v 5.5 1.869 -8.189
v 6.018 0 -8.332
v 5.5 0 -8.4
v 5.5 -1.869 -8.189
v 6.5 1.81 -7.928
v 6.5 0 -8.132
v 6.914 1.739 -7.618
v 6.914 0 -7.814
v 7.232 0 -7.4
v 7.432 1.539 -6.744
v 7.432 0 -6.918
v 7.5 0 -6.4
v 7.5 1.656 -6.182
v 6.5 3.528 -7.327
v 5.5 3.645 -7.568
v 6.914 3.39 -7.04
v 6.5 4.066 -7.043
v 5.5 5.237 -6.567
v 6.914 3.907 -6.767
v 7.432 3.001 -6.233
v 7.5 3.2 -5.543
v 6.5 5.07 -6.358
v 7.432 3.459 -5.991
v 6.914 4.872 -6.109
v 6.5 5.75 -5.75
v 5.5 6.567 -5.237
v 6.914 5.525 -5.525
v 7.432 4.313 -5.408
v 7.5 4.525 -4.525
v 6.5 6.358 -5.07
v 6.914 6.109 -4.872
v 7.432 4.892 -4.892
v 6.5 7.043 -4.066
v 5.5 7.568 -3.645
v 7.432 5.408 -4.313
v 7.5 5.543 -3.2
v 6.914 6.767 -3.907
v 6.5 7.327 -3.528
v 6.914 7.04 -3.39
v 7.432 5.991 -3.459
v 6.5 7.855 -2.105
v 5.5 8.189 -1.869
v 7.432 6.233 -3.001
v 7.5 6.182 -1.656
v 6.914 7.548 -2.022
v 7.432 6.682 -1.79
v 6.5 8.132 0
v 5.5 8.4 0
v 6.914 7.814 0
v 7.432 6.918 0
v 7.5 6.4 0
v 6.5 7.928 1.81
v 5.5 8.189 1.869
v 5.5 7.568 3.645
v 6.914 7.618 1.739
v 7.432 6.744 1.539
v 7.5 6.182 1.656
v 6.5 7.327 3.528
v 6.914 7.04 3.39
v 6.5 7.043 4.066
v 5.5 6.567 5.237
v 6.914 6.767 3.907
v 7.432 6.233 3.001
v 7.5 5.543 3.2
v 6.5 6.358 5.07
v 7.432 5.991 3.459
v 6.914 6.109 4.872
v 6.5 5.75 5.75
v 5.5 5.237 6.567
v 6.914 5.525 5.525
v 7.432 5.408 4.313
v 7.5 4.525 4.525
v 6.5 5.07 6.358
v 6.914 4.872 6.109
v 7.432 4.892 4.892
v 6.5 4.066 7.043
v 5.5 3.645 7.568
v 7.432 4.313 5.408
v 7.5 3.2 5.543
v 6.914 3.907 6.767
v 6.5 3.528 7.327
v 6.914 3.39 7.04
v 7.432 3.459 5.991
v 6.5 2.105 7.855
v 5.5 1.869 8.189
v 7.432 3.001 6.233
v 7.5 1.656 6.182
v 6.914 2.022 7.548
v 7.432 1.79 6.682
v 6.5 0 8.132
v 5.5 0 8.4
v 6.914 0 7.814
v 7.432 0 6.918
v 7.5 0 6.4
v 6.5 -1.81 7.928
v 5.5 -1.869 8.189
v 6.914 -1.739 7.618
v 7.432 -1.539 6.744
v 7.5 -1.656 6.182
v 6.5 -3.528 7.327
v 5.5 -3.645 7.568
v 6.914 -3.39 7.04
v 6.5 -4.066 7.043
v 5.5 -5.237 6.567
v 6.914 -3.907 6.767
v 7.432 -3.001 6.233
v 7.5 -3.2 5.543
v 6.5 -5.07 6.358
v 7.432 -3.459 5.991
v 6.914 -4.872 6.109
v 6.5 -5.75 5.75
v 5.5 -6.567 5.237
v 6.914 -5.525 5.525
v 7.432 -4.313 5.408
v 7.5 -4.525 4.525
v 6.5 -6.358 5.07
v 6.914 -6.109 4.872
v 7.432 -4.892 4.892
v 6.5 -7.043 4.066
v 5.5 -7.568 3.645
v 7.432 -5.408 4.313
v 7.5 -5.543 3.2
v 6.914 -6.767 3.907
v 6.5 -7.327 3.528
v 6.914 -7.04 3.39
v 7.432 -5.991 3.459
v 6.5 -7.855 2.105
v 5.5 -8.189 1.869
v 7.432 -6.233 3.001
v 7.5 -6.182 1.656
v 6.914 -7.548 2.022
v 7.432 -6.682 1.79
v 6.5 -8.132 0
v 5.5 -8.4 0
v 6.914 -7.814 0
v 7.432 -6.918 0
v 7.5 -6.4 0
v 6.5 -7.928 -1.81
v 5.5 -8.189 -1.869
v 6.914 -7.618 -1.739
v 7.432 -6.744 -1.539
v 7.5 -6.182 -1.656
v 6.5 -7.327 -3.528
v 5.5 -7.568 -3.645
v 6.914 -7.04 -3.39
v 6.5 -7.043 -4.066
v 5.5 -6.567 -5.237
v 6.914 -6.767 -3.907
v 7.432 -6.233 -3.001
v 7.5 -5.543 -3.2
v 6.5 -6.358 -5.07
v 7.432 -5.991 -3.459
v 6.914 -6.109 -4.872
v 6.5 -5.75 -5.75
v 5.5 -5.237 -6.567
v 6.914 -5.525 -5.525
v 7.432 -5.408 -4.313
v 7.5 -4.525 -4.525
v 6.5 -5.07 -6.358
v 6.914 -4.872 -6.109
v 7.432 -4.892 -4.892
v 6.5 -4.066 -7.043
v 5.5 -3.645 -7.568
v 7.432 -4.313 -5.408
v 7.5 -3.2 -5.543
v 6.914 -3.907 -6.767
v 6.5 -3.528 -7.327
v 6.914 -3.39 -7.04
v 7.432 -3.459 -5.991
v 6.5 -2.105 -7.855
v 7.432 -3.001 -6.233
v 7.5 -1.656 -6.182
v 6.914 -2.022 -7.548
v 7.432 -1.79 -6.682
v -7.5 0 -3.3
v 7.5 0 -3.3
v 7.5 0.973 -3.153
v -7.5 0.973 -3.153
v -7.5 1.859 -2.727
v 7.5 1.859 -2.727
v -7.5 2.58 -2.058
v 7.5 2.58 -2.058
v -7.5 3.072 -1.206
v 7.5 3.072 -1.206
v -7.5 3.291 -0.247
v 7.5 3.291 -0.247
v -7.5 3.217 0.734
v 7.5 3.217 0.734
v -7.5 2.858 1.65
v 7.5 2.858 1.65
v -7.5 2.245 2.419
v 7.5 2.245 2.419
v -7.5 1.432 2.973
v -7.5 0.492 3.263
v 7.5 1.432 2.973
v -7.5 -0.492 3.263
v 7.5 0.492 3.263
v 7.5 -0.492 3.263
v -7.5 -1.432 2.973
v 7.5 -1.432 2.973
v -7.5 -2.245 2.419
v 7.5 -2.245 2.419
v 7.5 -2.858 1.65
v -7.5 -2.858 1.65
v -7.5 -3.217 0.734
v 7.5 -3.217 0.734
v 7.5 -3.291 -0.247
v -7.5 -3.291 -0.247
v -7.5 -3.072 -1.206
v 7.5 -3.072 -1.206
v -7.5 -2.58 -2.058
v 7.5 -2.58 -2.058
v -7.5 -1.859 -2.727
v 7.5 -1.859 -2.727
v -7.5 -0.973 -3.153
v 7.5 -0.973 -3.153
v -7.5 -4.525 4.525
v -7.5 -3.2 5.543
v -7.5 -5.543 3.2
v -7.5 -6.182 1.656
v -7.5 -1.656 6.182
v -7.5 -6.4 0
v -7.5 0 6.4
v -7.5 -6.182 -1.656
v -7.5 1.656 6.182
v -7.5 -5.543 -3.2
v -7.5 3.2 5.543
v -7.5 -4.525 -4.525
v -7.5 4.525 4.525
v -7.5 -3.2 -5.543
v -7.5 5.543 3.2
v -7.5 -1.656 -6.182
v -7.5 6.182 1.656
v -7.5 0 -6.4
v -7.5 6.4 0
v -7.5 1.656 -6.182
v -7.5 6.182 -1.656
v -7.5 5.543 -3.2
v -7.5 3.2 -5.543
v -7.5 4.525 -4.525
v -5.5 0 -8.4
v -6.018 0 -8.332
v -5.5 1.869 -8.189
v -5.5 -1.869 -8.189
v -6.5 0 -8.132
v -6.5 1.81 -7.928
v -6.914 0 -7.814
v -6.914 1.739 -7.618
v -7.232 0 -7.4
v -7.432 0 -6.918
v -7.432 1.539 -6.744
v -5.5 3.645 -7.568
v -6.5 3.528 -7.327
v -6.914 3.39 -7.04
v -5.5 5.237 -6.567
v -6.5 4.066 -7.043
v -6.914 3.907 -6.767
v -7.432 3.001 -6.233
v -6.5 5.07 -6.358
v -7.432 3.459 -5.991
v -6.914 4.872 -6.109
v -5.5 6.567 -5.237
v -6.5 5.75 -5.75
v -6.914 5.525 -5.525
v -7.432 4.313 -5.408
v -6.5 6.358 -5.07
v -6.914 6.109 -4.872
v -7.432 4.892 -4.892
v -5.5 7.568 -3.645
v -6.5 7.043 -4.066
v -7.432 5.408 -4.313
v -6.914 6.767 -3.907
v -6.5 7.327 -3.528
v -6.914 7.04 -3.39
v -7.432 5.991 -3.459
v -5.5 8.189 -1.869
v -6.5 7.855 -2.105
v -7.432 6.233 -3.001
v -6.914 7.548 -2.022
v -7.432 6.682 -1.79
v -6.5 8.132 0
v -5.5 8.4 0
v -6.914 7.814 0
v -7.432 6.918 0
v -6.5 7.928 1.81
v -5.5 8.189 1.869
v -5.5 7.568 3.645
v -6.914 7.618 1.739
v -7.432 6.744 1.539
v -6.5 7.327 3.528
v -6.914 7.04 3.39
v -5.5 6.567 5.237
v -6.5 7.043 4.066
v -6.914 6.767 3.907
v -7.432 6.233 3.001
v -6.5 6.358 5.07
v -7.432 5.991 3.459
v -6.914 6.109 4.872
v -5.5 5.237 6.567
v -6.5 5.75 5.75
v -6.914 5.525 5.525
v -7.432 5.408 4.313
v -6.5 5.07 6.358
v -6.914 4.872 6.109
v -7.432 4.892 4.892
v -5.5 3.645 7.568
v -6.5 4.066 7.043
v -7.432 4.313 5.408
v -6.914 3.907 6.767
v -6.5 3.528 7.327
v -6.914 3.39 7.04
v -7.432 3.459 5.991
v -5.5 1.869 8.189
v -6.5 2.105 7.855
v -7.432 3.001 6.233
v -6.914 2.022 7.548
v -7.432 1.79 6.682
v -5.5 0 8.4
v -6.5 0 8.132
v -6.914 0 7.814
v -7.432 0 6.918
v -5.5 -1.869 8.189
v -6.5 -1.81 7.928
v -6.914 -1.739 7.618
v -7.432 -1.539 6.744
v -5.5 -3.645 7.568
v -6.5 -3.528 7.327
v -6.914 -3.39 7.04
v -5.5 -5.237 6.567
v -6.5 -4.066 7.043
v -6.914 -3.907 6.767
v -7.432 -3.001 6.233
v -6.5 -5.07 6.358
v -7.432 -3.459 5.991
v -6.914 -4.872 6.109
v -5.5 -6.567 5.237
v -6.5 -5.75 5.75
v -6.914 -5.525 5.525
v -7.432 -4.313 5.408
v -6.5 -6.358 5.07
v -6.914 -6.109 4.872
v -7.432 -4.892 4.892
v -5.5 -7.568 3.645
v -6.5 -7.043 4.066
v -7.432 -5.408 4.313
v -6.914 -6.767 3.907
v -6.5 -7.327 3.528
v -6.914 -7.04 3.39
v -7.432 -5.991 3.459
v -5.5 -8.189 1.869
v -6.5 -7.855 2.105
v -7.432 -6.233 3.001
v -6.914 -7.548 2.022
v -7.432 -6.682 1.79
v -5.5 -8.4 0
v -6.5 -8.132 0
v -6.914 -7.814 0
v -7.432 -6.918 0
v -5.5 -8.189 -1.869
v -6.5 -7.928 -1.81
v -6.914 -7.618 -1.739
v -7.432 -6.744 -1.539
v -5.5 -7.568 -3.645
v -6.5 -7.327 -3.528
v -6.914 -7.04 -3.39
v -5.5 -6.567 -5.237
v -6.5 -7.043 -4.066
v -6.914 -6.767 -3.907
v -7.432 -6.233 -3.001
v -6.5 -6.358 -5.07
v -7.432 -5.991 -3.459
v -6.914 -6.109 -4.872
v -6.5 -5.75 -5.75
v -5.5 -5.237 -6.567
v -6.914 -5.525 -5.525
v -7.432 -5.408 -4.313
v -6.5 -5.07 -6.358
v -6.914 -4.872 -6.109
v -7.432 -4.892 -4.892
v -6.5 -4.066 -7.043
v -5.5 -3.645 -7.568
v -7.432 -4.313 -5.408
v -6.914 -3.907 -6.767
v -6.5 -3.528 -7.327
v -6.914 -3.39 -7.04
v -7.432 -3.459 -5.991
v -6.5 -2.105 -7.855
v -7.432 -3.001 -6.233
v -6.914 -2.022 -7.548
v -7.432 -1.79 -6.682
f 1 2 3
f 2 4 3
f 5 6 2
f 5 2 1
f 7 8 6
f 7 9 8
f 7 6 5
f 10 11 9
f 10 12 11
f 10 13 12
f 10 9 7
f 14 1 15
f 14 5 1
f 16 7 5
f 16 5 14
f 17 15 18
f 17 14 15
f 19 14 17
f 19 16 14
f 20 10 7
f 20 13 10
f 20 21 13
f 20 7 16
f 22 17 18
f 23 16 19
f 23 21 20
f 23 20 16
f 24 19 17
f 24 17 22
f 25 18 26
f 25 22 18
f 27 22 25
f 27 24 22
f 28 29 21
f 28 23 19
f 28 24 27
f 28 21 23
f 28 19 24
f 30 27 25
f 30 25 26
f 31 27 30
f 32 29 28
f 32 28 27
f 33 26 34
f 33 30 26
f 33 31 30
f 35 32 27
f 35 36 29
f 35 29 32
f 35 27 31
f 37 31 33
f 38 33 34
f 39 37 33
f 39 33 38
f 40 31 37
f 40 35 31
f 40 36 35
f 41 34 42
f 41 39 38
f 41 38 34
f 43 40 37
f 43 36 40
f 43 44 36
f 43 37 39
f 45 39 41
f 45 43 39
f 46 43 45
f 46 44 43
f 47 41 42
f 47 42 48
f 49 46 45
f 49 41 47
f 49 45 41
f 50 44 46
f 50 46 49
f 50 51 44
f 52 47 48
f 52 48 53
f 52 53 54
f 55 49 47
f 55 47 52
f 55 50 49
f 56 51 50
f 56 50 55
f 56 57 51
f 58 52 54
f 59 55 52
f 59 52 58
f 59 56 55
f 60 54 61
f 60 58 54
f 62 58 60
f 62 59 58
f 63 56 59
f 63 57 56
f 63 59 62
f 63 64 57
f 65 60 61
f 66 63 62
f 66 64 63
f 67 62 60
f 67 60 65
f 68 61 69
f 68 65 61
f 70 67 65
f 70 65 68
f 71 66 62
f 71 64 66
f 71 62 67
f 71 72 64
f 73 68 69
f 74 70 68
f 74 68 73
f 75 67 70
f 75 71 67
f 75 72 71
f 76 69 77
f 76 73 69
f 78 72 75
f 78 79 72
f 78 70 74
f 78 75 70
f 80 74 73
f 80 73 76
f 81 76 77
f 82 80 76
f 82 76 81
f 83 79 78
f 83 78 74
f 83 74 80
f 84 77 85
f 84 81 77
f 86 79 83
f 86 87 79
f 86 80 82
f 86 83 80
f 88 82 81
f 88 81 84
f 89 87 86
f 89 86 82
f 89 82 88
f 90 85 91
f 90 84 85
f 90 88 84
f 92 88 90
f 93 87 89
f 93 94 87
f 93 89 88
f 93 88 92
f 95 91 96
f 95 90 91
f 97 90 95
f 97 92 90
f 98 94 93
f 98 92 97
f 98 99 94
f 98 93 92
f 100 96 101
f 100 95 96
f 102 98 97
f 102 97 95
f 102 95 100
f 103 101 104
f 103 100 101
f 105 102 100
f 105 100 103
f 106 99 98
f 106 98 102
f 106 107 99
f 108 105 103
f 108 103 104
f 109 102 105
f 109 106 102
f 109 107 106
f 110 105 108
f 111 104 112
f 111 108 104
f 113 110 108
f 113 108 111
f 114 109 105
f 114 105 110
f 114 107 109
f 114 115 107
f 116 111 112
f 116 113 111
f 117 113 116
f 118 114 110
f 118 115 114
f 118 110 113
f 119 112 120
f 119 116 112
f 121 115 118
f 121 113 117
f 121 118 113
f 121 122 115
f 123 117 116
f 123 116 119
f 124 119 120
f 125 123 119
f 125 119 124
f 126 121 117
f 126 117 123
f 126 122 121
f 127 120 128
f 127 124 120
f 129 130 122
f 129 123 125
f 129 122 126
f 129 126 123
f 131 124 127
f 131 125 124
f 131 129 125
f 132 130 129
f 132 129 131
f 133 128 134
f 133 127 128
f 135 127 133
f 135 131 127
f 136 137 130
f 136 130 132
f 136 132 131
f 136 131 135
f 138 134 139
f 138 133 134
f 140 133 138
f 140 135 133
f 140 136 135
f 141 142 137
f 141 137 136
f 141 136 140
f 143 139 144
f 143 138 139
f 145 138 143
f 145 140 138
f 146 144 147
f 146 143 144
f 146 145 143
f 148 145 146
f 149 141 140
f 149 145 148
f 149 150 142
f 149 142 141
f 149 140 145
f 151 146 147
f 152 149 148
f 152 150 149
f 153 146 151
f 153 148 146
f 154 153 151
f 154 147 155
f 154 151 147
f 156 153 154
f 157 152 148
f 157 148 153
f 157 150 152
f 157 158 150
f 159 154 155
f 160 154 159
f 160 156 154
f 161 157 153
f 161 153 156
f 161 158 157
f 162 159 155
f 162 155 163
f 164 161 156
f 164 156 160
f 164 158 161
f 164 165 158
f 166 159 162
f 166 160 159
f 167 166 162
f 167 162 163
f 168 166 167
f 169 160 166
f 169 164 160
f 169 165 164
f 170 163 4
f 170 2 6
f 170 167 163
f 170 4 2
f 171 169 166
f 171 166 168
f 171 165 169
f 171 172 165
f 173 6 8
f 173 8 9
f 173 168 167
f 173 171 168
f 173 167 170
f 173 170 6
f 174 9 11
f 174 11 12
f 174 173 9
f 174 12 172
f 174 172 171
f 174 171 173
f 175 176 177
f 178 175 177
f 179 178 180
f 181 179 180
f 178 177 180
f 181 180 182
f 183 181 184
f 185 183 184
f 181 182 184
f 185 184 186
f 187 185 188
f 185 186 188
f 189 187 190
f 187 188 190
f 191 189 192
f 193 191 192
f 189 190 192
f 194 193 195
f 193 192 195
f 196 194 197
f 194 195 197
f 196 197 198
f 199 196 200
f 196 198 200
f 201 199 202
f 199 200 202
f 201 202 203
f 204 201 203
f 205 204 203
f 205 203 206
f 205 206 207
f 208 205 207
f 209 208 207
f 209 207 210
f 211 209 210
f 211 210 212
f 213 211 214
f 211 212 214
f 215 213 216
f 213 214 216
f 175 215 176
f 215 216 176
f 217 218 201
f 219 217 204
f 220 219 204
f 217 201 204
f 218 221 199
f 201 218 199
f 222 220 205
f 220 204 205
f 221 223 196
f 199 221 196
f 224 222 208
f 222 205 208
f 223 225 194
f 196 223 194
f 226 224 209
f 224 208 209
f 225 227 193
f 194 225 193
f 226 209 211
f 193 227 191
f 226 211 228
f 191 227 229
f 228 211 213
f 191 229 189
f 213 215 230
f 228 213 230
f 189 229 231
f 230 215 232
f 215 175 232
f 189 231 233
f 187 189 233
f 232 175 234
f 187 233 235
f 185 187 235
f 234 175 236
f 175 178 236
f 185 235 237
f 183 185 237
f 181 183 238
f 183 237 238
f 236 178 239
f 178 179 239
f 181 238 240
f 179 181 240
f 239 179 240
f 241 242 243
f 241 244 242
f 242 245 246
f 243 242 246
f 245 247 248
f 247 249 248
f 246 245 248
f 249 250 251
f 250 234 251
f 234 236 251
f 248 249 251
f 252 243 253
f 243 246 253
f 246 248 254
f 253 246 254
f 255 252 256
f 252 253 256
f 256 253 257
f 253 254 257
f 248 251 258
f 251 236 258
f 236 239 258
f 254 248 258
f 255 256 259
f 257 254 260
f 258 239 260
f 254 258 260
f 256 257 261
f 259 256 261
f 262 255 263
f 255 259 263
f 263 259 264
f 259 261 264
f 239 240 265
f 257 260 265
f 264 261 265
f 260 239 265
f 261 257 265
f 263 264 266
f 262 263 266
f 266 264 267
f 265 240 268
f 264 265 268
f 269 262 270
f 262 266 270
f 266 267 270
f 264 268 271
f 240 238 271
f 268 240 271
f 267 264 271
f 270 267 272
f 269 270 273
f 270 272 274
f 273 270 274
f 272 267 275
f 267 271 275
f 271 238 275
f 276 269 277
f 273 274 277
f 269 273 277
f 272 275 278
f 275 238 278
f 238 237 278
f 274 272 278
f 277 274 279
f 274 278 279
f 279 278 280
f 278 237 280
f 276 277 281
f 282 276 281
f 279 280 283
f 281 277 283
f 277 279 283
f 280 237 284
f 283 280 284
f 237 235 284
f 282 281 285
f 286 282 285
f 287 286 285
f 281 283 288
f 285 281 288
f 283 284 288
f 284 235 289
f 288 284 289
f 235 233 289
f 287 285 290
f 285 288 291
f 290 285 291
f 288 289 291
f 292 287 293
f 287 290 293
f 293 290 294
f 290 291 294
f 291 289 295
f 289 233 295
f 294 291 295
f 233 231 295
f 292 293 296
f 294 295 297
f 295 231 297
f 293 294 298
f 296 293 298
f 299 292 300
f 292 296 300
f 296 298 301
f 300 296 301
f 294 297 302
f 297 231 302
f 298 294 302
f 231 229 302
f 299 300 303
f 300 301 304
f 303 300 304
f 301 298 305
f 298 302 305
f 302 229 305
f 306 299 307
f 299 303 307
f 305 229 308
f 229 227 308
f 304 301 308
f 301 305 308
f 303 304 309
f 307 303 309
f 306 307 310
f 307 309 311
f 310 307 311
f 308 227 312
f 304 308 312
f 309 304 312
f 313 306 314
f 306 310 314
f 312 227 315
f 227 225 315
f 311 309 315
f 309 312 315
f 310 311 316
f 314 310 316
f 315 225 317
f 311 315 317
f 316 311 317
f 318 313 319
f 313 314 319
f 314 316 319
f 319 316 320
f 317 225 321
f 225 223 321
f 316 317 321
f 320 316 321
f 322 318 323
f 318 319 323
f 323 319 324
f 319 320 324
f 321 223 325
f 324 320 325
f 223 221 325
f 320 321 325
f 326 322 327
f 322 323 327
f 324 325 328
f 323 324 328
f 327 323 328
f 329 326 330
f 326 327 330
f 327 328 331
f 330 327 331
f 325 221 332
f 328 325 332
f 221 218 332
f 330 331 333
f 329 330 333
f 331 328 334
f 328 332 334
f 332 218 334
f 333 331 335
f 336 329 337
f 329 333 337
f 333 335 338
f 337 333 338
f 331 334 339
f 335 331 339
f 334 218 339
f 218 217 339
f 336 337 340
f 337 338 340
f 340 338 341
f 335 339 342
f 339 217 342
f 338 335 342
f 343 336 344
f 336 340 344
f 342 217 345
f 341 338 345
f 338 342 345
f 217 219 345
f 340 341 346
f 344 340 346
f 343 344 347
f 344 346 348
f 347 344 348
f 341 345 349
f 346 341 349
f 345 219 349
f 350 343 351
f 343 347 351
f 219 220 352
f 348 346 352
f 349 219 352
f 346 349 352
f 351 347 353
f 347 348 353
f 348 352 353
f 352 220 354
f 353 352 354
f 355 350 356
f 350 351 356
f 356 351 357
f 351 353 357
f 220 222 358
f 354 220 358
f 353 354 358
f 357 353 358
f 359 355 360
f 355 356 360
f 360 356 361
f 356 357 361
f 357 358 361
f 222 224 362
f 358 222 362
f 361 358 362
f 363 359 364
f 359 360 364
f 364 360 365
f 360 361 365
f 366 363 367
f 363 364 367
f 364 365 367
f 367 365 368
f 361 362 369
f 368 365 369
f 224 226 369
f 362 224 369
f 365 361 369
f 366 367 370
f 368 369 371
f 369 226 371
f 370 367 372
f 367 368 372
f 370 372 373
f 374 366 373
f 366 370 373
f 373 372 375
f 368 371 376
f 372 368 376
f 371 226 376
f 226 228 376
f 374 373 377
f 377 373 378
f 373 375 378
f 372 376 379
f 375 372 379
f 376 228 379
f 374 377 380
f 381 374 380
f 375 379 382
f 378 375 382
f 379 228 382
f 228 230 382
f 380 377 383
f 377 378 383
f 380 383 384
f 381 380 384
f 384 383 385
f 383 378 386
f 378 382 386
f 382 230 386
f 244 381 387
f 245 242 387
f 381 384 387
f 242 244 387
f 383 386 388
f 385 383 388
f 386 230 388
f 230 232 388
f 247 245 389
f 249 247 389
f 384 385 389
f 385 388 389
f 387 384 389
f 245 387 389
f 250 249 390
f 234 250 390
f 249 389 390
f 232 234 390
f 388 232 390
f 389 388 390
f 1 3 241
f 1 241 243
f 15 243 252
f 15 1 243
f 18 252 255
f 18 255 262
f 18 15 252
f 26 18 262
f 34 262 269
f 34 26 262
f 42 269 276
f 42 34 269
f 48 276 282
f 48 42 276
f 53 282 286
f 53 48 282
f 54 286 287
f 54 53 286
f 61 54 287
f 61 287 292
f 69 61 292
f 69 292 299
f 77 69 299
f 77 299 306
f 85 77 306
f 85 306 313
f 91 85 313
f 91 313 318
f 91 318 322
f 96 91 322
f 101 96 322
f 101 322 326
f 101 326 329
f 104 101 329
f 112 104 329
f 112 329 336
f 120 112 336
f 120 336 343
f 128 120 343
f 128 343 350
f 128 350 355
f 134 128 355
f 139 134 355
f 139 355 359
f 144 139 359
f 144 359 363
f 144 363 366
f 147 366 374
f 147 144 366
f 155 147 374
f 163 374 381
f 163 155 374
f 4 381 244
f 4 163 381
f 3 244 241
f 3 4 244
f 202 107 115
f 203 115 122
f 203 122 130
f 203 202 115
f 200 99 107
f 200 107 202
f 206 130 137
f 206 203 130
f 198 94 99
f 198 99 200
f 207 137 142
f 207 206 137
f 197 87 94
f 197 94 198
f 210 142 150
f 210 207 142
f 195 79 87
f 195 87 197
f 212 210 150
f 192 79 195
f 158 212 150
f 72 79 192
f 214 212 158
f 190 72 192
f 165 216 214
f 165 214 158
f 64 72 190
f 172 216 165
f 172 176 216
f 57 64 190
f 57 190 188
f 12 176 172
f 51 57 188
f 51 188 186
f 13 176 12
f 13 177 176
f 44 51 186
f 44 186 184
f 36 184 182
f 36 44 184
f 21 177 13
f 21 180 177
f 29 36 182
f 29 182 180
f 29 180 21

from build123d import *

# Parameters (mm, degrees)
SKETCH_1_R          = 8.4
EXTRUDE_1_DEPTH     = 7.5
SKETCH_2_R          = 3.3
CUT_EXTRUDE_1_DEPTH = 15
FILLET_1_R          = 2


with BuildPart() as part:
    # 草图1 → 凸台-拉伸1 (new, symmetric)
    with BuildSketch(Plane(origin=(0, 0, 0), x_dir=(0, 0, -1), z_dir=(1, 0, 0))):
        Circle(SKETCH_1_R)
    extrude(amount=EXTRUDE_1_DEPTH, both=True)

    # 草图2 → 切除-拉伸1 (cut)
    with BuildSketch(Plane(origin=(7.5, 0, 0), x_dir=(0, 0, -1), z_dir=(1, 0, 0))):
        Circle(SKETCH_2_R)
    extrude(amount=-CUT_EXTRUDE_1_DEPTH, mode=Mode.SUBTRACT)

    # 圆角1
    fillet_1_edges = [part.edges().sort_by_distance(p)[0] for p in [
        (-7.5, 0, 8.4),
        (7.5, 0, 8.4),
    ]]
    fillet(fillet_1_edges, radius=FILLET_1_R)


solid = part.part
